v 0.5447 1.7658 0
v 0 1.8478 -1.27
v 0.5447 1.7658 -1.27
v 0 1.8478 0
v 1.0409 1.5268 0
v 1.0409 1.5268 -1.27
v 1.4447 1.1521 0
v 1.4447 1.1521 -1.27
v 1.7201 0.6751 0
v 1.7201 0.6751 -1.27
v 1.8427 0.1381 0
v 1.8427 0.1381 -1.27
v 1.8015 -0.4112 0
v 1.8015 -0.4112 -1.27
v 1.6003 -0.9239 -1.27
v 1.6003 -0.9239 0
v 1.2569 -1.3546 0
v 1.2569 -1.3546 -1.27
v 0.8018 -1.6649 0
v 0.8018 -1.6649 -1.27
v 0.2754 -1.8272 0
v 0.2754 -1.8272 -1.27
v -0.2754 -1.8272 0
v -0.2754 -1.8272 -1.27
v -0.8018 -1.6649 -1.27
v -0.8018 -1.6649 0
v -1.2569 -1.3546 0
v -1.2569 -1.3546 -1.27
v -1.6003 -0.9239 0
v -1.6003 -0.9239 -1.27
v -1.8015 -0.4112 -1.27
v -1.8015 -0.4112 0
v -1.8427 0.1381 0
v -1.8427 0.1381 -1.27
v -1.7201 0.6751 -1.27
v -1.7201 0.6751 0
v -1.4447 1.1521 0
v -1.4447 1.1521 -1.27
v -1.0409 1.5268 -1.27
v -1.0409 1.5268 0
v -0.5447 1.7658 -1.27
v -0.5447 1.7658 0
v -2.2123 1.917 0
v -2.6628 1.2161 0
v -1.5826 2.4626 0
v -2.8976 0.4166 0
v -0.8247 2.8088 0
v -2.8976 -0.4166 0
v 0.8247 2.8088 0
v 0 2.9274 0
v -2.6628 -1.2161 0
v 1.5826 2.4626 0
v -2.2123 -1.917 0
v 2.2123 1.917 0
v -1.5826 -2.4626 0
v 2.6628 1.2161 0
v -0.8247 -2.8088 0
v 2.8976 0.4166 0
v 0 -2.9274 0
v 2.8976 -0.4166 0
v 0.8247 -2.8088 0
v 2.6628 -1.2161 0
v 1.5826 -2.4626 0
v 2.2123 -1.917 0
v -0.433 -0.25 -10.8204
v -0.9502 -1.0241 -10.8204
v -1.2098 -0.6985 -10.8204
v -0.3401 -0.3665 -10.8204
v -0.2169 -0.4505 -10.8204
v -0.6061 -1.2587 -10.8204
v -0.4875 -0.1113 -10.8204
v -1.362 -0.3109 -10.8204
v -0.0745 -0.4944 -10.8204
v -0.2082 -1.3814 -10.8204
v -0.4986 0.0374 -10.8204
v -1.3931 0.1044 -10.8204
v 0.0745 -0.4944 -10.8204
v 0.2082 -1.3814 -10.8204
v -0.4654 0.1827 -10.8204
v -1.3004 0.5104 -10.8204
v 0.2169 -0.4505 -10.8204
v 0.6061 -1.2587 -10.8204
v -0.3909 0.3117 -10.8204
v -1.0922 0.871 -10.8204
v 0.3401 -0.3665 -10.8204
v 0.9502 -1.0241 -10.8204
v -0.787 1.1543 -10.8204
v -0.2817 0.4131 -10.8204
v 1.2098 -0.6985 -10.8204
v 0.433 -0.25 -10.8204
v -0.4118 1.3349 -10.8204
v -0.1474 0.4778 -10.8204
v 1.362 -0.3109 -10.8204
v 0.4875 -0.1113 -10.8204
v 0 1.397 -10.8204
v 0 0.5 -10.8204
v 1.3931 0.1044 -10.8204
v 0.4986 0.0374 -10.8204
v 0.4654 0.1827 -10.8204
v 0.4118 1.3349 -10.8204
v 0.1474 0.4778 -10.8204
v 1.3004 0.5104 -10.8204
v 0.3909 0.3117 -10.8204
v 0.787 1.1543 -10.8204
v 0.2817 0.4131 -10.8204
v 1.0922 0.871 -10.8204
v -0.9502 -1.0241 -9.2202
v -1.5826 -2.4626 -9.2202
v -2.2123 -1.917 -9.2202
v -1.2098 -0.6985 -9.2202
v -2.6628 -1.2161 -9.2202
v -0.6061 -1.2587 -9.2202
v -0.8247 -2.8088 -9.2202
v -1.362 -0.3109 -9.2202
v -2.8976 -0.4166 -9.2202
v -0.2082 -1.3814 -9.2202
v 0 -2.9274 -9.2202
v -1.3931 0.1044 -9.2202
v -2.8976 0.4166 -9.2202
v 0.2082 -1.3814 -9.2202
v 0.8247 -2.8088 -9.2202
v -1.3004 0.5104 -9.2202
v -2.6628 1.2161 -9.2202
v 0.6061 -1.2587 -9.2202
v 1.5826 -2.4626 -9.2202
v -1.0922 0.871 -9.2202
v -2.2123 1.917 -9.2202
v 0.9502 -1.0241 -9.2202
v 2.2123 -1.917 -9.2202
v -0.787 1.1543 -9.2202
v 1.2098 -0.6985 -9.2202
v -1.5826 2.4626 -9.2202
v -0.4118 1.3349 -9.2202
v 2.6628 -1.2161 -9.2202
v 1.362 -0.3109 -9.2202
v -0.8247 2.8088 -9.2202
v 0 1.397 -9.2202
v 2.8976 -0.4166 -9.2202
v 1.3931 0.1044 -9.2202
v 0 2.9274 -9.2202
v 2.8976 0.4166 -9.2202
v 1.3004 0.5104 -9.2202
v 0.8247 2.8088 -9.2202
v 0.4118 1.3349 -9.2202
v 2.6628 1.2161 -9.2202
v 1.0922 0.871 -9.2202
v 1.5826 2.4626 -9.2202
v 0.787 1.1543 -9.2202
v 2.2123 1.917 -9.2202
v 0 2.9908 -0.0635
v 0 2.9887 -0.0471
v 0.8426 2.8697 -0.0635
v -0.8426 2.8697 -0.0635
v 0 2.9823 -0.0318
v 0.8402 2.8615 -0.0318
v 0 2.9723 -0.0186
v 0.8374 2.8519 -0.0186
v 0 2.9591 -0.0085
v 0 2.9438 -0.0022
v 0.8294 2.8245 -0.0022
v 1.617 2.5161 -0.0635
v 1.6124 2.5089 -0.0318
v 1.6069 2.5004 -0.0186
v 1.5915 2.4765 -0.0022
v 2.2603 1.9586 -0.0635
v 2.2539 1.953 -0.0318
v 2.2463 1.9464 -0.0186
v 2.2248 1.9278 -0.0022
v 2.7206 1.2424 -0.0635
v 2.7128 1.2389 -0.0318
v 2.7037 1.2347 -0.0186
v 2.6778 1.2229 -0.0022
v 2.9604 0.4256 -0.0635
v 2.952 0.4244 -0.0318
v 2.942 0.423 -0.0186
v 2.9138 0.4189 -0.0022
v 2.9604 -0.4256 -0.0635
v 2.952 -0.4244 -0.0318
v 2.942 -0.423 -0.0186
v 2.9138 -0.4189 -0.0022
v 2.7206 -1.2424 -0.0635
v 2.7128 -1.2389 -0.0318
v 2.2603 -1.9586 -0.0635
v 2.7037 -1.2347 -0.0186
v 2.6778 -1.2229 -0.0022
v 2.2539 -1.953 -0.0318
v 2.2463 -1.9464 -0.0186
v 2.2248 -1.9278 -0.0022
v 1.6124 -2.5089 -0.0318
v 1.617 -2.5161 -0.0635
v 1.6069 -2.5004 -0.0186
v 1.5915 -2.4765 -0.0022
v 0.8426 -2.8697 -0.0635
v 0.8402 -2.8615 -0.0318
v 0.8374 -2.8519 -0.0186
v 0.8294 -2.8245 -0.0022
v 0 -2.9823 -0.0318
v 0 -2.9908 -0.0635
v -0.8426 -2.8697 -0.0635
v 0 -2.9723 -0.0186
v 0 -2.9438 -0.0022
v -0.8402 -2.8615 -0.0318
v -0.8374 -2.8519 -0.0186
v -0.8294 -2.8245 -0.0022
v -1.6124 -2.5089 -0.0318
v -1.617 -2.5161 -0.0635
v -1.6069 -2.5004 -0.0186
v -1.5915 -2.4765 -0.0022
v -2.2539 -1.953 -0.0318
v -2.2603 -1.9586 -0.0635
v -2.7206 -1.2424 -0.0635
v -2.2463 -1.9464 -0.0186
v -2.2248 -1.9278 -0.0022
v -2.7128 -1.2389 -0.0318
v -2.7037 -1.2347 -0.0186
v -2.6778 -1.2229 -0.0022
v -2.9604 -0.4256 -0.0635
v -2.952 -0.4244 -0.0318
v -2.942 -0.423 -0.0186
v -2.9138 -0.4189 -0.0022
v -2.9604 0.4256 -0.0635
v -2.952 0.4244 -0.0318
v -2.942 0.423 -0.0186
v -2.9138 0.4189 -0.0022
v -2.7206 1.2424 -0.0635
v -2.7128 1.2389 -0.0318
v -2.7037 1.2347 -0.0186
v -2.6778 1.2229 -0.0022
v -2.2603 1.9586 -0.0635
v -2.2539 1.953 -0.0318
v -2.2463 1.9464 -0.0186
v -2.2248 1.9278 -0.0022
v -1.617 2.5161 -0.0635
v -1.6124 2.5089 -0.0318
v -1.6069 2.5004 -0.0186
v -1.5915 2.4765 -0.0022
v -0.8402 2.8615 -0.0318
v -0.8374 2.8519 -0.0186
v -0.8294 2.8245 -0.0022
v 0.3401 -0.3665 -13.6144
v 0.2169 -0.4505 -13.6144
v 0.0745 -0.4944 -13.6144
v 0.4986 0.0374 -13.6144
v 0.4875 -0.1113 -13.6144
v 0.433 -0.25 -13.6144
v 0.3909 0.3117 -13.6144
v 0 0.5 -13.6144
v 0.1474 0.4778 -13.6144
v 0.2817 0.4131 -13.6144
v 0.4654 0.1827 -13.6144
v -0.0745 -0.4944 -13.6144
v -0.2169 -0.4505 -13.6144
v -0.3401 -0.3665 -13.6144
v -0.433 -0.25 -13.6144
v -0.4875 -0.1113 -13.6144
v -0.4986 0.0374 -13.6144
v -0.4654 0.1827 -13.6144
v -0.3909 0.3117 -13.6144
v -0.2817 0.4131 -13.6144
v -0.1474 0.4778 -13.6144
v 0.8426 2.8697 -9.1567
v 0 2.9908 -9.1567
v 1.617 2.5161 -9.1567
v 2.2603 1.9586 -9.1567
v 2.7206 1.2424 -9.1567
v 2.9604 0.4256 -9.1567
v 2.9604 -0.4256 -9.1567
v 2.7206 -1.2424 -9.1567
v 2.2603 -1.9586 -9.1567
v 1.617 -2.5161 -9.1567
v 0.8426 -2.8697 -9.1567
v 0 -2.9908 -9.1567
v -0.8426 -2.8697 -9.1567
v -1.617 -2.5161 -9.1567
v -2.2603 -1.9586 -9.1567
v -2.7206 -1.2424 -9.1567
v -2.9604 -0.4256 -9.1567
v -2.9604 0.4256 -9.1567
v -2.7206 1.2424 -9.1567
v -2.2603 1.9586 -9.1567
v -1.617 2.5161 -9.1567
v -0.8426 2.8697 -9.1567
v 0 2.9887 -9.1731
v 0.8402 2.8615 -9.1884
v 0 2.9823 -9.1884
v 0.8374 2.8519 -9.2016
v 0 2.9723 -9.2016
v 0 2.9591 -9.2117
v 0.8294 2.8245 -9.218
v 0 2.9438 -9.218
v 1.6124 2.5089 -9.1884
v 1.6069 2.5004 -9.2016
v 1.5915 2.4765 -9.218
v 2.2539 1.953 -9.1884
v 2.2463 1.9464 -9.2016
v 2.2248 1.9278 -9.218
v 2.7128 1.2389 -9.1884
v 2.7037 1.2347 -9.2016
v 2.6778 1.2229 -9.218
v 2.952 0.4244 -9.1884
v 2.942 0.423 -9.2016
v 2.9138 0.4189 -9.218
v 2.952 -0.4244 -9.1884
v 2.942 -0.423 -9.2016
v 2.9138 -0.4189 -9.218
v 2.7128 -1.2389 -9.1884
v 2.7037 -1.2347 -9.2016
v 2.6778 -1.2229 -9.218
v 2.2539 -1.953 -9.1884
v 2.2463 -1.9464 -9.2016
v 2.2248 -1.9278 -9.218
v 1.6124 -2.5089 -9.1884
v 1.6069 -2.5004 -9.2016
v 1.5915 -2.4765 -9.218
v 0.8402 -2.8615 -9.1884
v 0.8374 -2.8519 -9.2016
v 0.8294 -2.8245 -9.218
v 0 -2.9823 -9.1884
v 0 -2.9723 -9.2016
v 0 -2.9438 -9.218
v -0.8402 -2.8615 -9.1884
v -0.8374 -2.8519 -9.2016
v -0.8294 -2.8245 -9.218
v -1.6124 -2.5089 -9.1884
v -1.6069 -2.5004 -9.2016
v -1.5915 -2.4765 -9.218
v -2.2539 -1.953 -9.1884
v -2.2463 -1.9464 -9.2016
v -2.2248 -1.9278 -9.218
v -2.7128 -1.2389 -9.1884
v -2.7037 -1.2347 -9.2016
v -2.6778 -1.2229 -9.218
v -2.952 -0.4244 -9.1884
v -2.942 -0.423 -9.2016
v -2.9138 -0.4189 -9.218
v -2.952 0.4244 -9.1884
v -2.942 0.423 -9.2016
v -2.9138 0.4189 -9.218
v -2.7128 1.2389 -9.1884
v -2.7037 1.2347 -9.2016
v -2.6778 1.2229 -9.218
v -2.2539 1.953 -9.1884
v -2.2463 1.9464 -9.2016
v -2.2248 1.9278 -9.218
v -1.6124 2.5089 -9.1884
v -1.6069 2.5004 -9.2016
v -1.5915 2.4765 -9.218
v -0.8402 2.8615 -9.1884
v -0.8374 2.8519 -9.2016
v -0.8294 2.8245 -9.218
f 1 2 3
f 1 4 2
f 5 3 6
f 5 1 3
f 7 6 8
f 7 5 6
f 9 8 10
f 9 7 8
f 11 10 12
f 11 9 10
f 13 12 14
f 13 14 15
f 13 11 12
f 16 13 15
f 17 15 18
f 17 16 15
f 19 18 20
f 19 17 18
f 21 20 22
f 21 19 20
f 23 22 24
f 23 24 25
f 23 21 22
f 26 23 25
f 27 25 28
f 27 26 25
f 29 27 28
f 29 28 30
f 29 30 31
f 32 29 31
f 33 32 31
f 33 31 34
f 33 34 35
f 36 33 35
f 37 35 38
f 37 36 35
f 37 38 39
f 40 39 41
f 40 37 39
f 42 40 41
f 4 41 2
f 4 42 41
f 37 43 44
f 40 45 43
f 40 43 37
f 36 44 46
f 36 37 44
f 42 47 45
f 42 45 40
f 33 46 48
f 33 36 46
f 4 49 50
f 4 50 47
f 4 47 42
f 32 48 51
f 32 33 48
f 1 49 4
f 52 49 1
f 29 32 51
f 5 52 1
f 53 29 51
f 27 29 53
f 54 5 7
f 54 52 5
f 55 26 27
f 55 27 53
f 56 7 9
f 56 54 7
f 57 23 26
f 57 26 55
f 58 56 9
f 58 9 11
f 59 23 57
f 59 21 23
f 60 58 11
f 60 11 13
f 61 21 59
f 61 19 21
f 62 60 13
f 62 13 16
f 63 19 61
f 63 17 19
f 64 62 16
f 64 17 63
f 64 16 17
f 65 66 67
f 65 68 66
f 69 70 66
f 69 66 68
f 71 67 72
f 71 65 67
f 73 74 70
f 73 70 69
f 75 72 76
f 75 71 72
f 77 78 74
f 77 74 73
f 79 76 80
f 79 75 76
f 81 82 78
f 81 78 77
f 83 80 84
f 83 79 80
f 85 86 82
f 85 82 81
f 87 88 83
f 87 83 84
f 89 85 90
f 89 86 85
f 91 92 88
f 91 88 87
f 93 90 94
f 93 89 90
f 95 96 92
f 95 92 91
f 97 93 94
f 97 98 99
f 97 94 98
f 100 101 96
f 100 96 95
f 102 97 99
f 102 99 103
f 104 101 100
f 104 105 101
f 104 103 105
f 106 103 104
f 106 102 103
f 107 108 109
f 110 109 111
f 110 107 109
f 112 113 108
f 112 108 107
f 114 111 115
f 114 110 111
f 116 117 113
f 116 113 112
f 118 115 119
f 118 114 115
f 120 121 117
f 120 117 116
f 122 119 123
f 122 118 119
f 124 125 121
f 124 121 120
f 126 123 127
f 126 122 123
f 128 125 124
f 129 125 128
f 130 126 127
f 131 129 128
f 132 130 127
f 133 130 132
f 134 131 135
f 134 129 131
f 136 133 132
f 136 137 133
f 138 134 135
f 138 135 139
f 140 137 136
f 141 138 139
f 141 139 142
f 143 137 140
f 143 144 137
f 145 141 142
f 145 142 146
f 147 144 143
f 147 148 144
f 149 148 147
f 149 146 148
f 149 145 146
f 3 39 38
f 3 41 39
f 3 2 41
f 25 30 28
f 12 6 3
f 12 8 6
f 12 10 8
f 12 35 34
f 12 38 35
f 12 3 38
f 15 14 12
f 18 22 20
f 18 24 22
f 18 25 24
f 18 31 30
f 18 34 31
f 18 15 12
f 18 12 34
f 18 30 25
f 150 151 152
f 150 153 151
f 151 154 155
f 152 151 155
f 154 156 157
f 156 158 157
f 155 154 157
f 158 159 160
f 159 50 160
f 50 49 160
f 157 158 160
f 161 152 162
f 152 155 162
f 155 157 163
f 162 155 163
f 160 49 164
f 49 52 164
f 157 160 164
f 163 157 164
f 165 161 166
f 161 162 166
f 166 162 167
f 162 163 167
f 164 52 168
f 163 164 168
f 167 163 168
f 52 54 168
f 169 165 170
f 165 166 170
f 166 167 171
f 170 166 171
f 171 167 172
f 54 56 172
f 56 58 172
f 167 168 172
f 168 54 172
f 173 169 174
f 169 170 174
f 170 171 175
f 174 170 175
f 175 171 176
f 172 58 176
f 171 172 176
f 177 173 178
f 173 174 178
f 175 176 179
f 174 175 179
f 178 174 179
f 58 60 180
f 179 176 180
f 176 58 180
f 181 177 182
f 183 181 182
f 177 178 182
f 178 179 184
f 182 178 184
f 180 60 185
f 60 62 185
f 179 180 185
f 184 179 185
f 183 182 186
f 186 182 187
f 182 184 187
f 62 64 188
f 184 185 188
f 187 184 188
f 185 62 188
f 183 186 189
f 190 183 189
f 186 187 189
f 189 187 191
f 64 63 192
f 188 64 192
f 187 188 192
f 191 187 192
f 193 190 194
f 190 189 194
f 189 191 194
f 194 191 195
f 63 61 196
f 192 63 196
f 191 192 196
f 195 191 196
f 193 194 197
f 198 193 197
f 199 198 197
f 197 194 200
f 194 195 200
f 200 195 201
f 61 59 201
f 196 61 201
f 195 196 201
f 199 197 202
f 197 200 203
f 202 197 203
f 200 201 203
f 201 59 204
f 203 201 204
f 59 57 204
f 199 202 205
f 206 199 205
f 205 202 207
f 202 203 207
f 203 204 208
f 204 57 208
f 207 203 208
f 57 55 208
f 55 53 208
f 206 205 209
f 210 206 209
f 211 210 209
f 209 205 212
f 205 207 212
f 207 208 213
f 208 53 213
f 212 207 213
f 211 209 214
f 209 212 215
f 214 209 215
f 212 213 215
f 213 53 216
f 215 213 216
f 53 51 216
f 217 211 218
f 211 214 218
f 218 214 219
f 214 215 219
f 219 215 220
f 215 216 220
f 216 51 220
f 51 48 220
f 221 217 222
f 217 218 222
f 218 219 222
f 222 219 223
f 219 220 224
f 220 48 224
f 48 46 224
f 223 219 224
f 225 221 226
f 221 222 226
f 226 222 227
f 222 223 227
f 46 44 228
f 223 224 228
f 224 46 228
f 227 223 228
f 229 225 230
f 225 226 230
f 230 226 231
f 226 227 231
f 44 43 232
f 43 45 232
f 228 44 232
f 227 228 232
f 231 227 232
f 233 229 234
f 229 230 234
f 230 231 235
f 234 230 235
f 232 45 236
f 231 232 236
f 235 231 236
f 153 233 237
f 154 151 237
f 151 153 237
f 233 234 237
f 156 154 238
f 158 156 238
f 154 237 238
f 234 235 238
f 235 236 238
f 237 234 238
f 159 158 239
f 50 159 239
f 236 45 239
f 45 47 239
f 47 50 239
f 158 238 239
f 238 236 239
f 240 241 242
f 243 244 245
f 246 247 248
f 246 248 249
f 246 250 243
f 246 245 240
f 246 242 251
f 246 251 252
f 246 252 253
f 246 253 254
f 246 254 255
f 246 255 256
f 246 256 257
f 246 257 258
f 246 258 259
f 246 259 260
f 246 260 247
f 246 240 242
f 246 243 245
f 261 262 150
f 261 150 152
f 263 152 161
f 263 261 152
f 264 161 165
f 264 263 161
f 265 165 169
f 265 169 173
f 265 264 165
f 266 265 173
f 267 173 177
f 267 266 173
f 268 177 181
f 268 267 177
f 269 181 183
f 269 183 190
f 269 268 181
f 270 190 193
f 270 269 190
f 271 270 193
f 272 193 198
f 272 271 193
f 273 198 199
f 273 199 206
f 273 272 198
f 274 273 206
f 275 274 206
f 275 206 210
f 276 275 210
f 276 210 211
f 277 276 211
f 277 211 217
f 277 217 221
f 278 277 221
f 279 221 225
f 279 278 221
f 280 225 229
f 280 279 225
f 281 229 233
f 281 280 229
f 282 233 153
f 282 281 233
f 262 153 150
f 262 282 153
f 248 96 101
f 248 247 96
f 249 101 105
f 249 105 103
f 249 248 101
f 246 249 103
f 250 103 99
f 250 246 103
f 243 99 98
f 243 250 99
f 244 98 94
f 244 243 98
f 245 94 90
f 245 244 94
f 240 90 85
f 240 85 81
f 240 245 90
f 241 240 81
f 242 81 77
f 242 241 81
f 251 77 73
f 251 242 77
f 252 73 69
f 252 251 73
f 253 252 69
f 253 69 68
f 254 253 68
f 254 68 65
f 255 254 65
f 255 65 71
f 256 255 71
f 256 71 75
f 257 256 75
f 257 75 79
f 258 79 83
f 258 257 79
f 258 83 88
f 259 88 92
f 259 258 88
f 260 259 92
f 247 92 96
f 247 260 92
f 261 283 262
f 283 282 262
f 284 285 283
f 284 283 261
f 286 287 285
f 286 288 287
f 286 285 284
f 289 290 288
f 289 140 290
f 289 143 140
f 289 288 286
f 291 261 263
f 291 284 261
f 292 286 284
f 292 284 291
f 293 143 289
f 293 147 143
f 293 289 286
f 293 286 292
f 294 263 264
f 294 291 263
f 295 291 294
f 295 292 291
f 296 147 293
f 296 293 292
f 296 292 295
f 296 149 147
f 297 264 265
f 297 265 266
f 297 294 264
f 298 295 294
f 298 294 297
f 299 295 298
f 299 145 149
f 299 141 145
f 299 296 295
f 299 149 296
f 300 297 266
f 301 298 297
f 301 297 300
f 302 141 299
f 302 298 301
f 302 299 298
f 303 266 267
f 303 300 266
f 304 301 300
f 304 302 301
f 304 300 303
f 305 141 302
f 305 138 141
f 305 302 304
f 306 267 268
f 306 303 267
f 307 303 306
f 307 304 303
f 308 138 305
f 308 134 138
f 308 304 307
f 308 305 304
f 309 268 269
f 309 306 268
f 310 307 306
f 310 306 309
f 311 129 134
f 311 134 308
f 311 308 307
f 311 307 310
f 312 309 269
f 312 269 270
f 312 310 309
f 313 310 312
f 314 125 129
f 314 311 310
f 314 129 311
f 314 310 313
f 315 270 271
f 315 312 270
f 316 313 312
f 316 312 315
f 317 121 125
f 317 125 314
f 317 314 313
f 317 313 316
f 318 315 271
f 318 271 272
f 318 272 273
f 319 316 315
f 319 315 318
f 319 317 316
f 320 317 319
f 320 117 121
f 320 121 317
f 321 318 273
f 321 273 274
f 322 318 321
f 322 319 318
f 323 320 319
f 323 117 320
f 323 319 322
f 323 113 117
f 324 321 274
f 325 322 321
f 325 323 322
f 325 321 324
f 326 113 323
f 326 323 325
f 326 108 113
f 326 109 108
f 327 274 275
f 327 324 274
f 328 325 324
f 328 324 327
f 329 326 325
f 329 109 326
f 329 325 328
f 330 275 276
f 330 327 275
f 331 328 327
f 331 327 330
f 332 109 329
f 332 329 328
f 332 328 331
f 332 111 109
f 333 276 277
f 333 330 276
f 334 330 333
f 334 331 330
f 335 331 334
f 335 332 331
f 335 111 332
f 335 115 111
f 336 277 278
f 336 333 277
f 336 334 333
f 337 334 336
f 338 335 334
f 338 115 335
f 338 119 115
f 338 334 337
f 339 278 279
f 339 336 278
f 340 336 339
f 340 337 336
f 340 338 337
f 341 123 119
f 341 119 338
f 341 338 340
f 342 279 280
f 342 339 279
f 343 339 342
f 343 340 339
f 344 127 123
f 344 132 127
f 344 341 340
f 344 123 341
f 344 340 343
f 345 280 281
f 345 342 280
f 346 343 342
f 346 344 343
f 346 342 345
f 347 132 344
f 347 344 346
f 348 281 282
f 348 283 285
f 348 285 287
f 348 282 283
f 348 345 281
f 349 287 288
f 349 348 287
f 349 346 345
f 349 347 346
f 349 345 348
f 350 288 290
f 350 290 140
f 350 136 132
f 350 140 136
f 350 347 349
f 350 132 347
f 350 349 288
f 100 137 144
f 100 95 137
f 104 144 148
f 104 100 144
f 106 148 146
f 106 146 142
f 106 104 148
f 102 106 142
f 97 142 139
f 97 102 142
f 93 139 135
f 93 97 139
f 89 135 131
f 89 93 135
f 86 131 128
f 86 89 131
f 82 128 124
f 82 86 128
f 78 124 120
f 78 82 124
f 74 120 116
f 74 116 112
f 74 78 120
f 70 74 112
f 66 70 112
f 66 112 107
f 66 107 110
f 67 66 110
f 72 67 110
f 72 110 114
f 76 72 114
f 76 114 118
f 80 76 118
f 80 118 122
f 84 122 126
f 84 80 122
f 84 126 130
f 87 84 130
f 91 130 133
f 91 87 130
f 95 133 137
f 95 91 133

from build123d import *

# Parameters (mm, degrees)
FILLET1_R = 0.0635


with BuildPart() as part:
    # Sketch1 → Revolve1 (revolve)
    with BuildSketch(Plane(origin=(0, 0, 0), x_dir=(0, 0, -1), z_dir=(1, 0, 0))):
        Polygon((0, 2.99085), (9.2202, 2.99085), (9.2202, 1.397), (10.8204, 1.397), (10.8204, 0.5), (13.6144, 0.5), (13.6144, 0), (1.27, 0), (1.27, 1.84785), (0, 1.84785), align=None)
    revolve(axis=Axis((0, 0, 14.404430618), (0, 0, -1)))

    # Fillet1
    fillet1_edges = [part.edges().sort_by_distance(p)[0] for p in [
        (0, -2.99085, 0),
        (0, -2.99085, -9.2202),
    ]]
    fillet(fillet1_edges, radius=FILLET1_R)


solid = part.part
